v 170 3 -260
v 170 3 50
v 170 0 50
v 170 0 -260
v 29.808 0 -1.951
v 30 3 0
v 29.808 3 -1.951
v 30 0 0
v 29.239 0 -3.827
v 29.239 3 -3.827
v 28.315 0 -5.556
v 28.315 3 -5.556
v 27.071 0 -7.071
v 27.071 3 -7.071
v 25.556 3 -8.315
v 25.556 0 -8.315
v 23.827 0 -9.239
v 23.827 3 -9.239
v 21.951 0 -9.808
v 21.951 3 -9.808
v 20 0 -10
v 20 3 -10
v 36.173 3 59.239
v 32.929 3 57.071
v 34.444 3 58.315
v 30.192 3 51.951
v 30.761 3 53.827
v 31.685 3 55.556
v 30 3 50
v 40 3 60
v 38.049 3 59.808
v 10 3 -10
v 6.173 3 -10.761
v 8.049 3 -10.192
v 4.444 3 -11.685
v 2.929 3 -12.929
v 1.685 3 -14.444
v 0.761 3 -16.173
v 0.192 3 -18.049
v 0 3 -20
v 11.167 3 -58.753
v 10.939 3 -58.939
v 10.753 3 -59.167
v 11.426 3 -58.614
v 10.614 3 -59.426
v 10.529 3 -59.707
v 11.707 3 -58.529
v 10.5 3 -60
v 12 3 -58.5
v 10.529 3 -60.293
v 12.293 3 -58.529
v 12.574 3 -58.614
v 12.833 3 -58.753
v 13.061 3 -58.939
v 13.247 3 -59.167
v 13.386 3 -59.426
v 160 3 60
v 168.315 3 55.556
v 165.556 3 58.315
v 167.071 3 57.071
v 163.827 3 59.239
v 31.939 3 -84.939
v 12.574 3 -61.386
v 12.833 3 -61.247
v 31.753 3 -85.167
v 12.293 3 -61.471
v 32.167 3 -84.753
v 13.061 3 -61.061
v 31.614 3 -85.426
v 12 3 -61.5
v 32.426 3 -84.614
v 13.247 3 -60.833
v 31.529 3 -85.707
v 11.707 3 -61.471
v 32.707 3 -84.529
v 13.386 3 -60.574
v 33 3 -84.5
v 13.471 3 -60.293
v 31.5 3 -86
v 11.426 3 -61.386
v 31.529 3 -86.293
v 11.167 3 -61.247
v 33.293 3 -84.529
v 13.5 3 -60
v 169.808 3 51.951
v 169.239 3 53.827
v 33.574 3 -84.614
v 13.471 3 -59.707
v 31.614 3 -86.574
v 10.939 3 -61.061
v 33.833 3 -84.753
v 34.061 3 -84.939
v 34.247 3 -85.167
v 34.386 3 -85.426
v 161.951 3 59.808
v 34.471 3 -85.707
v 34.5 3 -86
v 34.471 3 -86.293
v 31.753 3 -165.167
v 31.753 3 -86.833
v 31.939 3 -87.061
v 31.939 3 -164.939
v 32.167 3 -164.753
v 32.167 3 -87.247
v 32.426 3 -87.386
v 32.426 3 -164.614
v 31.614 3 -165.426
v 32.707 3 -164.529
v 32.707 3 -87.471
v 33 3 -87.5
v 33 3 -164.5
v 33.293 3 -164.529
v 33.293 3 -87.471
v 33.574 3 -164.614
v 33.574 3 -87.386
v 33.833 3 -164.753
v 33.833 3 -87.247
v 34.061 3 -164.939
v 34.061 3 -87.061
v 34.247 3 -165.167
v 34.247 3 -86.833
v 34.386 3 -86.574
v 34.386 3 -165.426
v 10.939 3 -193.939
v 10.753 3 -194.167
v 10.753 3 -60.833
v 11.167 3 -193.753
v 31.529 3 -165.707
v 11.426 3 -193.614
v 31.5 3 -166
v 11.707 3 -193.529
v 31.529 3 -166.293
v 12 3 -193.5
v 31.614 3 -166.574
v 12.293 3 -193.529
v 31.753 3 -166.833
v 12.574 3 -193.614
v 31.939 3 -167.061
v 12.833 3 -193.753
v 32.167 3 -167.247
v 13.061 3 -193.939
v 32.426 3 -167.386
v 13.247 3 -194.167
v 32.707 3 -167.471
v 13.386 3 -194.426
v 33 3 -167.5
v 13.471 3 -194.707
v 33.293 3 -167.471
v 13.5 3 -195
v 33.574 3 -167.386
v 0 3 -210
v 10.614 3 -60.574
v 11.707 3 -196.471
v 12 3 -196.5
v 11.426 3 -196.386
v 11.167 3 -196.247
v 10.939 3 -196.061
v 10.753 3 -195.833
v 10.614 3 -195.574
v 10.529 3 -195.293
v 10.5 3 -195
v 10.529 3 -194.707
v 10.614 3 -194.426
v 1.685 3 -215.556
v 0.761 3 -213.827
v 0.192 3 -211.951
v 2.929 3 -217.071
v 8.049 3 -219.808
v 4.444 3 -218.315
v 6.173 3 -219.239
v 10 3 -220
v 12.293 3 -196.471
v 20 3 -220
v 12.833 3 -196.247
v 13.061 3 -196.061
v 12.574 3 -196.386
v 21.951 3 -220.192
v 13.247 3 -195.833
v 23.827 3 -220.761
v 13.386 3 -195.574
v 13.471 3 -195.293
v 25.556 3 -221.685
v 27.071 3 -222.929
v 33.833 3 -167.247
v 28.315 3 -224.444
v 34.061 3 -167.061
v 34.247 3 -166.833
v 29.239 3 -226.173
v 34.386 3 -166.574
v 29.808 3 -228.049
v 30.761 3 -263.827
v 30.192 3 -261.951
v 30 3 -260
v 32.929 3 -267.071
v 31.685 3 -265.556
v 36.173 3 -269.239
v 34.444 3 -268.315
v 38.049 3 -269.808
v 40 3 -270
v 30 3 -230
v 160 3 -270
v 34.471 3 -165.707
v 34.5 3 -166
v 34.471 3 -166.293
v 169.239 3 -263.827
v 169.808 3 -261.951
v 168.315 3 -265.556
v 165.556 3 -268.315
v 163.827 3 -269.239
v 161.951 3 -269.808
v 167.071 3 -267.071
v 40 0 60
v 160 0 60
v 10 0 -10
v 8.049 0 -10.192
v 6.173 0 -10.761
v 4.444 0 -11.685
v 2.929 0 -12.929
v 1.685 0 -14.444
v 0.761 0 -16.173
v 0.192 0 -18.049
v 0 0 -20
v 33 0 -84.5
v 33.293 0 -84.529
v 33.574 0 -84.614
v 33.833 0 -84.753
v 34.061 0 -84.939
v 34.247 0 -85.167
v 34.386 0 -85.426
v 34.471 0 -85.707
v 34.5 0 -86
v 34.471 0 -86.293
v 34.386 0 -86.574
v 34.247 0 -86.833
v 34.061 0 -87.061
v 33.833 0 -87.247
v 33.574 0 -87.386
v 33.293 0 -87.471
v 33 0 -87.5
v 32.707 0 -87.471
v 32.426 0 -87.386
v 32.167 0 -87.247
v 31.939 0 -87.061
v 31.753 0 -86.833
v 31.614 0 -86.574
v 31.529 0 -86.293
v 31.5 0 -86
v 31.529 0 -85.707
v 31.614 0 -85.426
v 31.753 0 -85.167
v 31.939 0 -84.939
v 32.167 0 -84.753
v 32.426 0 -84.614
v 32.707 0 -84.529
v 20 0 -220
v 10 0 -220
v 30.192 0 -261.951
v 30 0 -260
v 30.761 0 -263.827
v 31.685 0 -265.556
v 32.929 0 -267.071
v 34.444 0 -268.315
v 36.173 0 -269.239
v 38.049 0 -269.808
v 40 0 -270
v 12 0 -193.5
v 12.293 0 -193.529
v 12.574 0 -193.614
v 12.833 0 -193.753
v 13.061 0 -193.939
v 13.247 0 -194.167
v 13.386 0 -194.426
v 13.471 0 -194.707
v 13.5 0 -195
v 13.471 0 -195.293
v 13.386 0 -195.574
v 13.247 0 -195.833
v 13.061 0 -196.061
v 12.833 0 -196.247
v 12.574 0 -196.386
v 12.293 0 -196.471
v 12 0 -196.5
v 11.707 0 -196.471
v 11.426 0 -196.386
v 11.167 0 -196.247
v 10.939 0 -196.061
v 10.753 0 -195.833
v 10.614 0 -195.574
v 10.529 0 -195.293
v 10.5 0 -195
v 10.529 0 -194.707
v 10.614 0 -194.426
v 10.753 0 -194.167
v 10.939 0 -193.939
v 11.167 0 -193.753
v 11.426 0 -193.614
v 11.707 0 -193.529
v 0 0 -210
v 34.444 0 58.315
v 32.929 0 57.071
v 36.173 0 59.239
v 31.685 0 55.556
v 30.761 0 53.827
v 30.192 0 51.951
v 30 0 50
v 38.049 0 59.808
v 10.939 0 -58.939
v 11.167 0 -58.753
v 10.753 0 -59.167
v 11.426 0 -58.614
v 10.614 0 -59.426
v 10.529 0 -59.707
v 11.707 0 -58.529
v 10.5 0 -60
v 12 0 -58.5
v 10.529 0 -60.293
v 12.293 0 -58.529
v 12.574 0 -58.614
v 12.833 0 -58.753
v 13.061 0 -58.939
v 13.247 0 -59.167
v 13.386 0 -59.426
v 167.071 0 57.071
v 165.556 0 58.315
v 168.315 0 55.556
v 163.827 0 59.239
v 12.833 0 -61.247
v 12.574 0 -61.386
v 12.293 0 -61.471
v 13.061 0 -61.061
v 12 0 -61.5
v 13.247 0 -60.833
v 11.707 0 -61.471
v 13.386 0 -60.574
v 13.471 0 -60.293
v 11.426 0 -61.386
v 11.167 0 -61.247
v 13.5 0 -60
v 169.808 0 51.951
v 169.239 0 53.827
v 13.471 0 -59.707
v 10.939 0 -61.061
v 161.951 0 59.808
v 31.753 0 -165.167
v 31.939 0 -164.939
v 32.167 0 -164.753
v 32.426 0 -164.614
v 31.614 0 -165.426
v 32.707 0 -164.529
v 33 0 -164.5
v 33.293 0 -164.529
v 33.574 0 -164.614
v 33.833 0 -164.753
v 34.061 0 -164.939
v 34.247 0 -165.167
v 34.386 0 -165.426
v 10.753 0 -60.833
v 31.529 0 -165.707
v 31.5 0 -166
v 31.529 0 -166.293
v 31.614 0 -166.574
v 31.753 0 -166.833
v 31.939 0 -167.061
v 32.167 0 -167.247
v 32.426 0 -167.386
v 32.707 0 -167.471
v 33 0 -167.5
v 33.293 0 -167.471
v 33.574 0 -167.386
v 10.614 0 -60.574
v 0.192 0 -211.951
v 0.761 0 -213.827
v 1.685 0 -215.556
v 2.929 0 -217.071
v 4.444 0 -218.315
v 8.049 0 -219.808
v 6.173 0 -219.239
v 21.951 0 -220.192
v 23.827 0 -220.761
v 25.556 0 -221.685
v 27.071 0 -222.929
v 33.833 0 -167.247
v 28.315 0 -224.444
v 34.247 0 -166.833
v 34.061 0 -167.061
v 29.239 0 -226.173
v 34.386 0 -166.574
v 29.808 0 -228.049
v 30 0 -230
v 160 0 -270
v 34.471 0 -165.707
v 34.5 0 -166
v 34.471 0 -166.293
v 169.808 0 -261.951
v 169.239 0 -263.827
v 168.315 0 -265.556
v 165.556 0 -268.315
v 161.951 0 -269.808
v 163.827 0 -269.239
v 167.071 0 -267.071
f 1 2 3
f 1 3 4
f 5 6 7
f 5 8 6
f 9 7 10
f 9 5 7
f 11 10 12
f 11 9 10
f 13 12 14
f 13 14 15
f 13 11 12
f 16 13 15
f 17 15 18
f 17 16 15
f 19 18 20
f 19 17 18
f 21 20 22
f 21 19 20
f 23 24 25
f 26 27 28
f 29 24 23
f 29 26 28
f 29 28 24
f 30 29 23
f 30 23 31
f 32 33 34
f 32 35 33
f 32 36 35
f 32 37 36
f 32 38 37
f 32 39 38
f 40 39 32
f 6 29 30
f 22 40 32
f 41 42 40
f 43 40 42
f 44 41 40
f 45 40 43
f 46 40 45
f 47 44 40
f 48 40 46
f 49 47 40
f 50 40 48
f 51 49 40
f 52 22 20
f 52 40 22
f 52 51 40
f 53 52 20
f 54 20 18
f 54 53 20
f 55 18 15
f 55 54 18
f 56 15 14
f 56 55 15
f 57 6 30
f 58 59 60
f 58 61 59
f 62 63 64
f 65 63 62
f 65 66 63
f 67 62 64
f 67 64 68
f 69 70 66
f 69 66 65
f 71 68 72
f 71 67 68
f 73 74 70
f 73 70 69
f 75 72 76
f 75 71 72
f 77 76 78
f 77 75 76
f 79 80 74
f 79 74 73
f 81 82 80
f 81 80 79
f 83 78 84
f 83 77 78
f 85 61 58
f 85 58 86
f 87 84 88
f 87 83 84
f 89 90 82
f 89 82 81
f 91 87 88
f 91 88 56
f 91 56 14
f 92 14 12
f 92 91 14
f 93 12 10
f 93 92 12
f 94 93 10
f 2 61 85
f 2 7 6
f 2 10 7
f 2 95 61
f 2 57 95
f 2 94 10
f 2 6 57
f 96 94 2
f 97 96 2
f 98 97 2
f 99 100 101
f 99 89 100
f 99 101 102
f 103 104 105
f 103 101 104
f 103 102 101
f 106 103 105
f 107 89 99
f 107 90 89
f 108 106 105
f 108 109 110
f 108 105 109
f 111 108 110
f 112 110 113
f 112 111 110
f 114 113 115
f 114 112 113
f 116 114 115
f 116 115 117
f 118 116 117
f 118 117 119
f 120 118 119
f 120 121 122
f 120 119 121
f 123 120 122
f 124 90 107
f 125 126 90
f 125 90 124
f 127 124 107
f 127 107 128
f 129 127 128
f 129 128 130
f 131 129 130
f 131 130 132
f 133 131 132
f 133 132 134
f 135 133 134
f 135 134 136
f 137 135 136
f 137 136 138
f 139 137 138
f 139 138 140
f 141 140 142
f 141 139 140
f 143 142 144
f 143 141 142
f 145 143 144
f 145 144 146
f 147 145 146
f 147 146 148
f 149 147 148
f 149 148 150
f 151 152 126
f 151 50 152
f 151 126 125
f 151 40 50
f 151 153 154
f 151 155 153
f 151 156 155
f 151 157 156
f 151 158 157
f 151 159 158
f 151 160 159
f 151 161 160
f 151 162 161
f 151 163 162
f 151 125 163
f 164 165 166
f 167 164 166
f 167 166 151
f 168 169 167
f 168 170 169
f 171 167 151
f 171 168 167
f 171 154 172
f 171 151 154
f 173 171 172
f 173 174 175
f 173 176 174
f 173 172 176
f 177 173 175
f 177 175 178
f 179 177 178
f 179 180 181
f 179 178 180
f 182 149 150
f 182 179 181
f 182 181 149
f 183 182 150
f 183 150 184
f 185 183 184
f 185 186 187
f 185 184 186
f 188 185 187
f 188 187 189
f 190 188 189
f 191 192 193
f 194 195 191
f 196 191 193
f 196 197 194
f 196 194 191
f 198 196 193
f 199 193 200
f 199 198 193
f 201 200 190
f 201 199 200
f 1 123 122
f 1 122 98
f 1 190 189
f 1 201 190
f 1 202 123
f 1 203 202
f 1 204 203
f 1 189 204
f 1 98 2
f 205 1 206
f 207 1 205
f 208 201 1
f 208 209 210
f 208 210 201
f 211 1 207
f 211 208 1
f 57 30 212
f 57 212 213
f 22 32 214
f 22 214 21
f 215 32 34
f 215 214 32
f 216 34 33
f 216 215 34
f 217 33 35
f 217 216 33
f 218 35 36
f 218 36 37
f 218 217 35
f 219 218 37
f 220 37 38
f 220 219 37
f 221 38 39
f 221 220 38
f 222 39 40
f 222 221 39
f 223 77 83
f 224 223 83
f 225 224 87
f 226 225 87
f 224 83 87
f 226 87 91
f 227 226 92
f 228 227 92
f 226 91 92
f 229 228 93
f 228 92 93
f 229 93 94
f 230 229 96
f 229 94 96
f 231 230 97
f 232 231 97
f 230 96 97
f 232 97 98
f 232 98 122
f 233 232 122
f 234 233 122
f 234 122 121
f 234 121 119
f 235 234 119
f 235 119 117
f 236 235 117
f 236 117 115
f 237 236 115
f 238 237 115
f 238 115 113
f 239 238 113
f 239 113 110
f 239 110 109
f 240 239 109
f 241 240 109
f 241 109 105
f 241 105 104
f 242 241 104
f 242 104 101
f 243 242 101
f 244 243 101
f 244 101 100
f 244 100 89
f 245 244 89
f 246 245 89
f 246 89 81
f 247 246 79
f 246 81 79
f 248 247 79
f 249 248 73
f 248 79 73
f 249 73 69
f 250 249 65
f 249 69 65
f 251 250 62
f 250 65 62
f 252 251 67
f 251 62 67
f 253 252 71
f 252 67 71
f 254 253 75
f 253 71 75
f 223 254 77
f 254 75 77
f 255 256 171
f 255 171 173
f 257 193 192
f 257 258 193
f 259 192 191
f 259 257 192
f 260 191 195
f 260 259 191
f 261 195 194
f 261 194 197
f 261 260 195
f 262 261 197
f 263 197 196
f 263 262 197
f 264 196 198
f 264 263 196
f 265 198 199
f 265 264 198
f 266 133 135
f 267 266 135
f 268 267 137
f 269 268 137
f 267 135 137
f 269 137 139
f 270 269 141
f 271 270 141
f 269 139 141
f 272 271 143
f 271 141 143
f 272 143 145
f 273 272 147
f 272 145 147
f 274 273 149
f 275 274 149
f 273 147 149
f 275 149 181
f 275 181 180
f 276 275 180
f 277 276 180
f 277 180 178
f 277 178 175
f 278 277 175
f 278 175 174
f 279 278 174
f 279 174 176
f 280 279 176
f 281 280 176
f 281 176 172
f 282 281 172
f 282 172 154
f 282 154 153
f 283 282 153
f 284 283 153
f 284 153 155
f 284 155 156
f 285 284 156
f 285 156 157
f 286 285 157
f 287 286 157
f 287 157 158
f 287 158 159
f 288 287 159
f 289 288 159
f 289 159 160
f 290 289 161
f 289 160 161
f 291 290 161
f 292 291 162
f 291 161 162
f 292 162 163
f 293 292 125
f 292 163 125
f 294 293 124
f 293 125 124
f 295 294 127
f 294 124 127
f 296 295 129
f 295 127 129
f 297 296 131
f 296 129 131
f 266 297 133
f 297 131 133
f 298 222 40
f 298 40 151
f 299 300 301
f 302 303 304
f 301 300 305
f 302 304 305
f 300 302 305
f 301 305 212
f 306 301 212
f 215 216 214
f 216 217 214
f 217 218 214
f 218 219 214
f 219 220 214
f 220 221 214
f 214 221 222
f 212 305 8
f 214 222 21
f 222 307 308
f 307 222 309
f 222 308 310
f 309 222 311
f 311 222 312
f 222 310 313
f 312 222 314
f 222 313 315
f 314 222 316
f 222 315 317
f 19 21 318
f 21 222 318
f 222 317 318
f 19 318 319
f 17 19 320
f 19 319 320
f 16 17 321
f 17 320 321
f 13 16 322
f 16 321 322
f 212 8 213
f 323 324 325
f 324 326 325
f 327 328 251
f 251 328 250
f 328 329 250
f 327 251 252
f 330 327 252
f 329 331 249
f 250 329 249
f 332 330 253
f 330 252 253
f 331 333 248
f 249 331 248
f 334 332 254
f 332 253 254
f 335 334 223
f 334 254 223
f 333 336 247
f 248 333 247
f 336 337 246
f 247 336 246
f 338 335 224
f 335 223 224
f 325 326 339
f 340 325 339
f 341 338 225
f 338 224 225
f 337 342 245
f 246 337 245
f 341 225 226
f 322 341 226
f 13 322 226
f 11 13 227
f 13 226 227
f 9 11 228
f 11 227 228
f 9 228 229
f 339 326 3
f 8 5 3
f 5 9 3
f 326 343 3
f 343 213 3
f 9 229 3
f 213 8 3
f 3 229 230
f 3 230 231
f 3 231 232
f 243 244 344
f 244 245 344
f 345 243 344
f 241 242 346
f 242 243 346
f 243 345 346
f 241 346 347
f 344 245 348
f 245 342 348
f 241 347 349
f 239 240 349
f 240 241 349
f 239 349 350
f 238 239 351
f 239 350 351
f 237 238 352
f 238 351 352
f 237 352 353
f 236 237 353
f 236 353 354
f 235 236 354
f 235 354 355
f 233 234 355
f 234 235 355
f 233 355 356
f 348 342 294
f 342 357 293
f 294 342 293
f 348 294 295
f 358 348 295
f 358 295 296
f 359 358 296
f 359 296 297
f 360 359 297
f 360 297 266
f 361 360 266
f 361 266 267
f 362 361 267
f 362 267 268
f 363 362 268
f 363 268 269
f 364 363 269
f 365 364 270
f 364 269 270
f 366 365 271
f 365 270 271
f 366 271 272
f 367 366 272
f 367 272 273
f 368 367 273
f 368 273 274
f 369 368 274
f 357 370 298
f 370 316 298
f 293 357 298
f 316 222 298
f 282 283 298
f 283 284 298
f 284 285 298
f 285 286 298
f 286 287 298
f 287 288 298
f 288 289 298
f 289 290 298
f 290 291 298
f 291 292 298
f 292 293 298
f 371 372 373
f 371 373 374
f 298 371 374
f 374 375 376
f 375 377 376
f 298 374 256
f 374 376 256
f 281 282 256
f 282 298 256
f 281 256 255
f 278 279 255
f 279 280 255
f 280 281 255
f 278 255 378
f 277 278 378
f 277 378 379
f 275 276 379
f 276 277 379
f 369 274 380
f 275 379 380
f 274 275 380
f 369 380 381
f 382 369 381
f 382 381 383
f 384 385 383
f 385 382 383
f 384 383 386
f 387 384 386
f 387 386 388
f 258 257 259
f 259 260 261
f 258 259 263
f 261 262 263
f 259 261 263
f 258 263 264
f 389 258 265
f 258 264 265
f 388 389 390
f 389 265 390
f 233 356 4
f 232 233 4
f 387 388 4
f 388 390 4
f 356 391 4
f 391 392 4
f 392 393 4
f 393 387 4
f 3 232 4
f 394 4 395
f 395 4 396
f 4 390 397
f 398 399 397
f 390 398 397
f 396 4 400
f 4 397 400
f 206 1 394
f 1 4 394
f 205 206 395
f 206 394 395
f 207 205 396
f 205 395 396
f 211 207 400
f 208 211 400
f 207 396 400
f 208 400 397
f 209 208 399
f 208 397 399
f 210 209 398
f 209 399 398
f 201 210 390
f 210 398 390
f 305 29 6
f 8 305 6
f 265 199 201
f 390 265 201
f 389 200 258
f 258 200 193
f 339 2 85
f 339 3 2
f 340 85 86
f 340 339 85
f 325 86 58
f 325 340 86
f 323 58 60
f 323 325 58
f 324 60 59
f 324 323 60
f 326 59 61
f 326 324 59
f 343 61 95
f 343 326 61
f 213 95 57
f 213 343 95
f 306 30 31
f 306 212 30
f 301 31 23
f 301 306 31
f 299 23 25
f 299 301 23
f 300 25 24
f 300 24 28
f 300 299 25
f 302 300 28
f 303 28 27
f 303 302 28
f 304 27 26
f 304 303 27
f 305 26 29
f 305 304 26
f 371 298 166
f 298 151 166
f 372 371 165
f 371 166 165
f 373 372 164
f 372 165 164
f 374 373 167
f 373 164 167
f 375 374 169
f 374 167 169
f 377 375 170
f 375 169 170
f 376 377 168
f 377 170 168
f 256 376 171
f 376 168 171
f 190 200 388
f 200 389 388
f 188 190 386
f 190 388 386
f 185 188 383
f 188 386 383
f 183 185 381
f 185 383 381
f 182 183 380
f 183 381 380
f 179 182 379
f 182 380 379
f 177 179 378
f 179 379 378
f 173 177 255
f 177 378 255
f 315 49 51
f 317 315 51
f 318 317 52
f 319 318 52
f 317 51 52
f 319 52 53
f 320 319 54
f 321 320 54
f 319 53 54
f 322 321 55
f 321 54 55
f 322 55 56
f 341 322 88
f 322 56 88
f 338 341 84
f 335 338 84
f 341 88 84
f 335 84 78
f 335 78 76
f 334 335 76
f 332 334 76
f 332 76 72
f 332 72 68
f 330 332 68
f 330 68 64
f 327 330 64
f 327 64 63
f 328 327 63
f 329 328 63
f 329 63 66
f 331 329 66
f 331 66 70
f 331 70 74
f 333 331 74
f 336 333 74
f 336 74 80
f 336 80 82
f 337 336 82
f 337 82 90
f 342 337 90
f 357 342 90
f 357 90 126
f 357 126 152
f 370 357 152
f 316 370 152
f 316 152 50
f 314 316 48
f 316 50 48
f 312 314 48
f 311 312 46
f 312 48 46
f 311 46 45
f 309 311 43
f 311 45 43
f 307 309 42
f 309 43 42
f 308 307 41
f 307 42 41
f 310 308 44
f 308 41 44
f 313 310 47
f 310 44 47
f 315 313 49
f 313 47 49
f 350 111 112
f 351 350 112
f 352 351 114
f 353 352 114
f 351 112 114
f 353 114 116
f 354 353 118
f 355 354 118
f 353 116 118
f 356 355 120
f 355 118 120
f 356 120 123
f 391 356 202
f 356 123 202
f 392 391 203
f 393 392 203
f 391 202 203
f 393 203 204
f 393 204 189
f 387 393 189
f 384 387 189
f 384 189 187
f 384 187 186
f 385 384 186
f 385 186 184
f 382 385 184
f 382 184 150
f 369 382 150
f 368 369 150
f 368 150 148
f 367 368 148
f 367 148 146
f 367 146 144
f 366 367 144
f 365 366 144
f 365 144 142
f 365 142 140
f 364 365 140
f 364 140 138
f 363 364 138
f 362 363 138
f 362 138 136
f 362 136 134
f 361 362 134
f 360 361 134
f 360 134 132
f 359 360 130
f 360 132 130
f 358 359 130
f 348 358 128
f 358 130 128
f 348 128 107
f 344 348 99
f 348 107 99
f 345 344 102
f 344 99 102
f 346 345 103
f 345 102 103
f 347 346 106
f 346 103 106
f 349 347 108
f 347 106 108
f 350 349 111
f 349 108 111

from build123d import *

# Parameters (mm, degrees)
SKETCH_1_W          = 170
SKETCH_1_H          = 220
EXTRUDE_1_DEPTH     = 3
SKETCH_3_R          = 1.5
CUT_EXTRUDE_1_DEPTH = 279.044960393
SKETCH_4_R          = 1.5
CUT_EXTRUDE_2_DEPTH = 279.044960393
SKETCH_5_W          = 170
SKETCH_5_H          = 10
CUT_EXTRUDE_3_DEPTH = 279.044960393
SKETCH_7_W          = 140
SKETCH_7_H          = 50
SKETCH_7_H_2        = 70
EXTRUDE_2_DEPTH     = 3
FILLET_1_R          = 10


with BuildPart() as part:
    # 草图1 → 凸台-拉伸1 (new body)
    with BuildSketch(Plane(origin=(0, 0, 0), x_dir=(1, 0, 0), z_dir=(0, 1, 0))):
        with Locations((85, 110)):
            Rectangle(SKETCH_1_W, SKETCH_1_H)
    extrude(amount=EXTRUDE_1_DEPTH)

    # 草图3 → 切除-拉伸1 (cut, through all)
    with BuildSketch(Plane(origin=(0, 3, 0), x_dir=(1, 0, 0), z_dir=(0, 1, 0))):
        with Locations(Location((33, 86, 0), (0, 0, 270))):
            Circle(SKETCH_3_R)
        with Locations(Location((33, 166, 0), (0, 0, 270))):
            Circle(SKETCH_3_R)
    extrude(amount=-CUT_EXTRUDE_1_DEPTH, mode=Mode.SUBTRACT)

    # 草图4 → 切除-拉伸2 (cut, through all)
    with BuildSketch(Plane(origin=(0, 3, 0), x_dir=(1, 0, 0), z_dir=(0, 1, 0))):
        with Locations(Location((12, 195, 0), (0, 0, 270))):
            Circle(SKETCH_4_R)
        with Locations(Location((12, 60, 0), (0, 0, 270))):
            Circle(SKETCH_4_R)
    extrude(amount=-CUT_EXTRUDE_2_DEPTH, mode=Mode.SUBTRACT)

    # 草图5 → 切除-拉伸3 (cut, through all)
    with BuildSketch(Plane(origin=(0, 3, 0), x_dir=(1, 0, 0), z_dir=(0, 1, 0))):
        with Locations((85, 5)):
            Rectangle(SKETCH_5_W, SKETCH_5_H)
    extrude(amount=-CUT_EXTRUDE_3_DEPTH, mode=Mode.SUBTRACT)

    # 草图7 → 凸台-拉伸2 (add)
    with BuildSketch(Plane(origin=(0, 3, 0), x_dir=(1, 0, 0), z_dir=(0, 1, 0))):
        with Locations((100, 245)):
            Rectangle(SKETCH_7_W, SKETCH_7_H)
        with Locations((100, -25)):
            Rectangle(SKETCH_7_W, SKETCH_7_H_2)
    extrude(amount=-EXTRUDE_2_DEPTH)

    # 圆角1
    fillet_1_edges = [part.edges().sort_by_distance(p)[0] for p in [
        (0, 1.5, -10),
        (30, 1.5, -270),
        (30, 1.5, -220),
        (170, 1.5, -270),
        (30, 1.5, -10),
        (30, 1.5, 60),
        (170, 1.5, 60),
        (0, 1.5, -220),
    ]]
    fillet(fillet_1_edges, radius=FILLET_1_R)


solid = part.part
